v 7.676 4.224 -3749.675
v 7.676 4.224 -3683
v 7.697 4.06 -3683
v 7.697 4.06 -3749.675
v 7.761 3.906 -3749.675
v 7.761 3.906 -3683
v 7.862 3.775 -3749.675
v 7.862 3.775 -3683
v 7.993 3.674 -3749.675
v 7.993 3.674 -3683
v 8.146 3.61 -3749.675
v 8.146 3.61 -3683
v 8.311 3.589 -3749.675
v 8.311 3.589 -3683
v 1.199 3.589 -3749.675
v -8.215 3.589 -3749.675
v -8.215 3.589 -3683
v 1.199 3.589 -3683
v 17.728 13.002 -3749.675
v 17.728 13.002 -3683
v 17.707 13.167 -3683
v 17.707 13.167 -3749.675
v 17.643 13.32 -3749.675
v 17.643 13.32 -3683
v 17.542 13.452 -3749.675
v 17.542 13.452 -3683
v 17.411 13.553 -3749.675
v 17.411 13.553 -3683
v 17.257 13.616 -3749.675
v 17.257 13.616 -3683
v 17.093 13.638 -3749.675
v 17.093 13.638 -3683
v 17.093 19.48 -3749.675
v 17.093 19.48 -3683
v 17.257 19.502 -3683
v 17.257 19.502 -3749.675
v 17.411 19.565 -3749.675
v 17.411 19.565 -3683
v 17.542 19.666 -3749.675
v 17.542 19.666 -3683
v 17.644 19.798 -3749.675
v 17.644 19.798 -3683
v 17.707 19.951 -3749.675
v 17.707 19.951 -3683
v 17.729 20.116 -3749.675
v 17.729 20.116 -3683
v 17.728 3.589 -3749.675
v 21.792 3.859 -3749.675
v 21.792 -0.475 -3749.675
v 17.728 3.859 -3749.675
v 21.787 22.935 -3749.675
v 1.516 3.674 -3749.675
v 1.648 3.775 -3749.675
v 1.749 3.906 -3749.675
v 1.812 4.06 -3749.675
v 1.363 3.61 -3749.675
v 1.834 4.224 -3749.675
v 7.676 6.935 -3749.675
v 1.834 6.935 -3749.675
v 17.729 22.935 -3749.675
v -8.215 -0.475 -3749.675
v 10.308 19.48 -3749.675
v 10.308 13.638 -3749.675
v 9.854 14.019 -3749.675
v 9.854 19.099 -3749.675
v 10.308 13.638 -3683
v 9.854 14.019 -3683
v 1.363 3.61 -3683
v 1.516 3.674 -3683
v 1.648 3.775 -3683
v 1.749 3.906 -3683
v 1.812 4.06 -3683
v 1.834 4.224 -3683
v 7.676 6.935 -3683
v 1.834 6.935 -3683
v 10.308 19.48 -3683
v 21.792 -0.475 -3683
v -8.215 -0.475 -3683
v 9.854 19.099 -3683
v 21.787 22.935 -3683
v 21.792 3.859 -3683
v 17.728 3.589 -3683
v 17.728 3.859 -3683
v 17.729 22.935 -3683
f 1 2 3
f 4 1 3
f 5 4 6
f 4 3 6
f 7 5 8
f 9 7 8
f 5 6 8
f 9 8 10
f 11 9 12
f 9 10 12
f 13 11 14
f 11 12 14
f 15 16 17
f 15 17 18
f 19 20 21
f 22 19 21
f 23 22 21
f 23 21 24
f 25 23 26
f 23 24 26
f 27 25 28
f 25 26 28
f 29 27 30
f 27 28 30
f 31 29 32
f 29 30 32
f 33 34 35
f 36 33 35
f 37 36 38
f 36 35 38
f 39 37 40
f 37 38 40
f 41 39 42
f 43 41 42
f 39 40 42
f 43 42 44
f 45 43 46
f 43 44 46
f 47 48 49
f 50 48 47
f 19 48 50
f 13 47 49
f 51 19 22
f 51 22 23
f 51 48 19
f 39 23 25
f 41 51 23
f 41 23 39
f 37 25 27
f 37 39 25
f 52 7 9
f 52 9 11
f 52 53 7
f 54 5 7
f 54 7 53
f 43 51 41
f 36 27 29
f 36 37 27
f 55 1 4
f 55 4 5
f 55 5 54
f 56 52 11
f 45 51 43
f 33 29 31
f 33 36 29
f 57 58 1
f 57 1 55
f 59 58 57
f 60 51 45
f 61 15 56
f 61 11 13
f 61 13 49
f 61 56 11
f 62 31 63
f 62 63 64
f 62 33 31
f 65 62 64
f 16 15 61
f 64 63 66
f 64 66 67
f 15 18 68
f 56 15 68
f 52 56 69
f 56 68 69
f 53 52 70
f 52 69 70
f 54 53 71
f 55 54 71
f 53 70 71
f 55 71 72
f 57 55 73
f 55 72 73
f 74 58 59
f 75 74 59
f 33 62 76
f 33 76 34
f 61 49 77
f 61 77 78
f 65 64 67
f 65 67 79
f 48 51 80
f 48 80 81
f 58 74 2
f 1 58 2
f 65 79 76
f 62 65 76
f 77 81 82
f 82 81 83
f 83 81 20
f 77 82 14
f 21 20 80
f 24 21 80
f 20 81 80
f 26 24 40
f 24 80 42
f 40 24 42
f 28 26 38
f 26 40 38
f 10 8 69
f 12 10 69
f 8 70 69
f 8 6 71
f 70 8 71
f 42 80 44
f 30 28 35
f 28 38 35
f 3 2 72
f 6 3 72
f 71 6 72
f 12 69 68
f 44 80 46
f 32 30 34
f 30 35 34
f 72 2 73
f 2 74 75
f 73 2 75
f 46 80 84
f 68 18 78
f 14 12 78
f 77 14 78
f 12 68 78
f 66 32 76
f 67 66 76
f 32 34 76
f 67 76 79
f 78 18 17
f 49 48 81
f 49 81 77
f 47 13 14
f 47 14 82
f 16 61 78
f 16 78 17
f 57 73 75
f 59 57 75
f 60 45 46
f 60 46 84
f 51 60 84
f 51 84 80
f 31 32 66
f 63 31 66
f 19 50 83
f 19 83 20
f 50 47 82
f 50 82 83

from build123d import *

# Parameters (mm, degrees)
BOSS_EXTRUDE1_DEPTH = 66.675
CUT_EXTRUDE1_REACH  = 75.8
CUT_EXTRUDE2_REACH  = 75.8
SKETCH6_W           = 5.842
SKETCH6_H           = 4.878381591
CUT_EXTRUDE4_DEPTH  = 74.800184057


with BuildPart() as part:
    # Sketch1 → Boss-Extrude1 (new body)
    with BuildSketch(Plane(origin=(0, 0, -3683), x_dir=(-1, 0, 0), z_dir=(0, 0, -1))):
        with BuildLine():
            Line((7.945265893, 3.588862728), (-1.198734107, 3.588862728))
            ThreePointArc((-1.198734107, 3.588862728), (-1.647746913, 3.774849922), (-1.833734107, 4.223862728))
            Line((-1.833734107, 4.223862728), (-1.833734107, 5.747862728))
            ThreePointArc((-1.833734107, 5.747862728), (-1.647746913, 6.196875535), (-1.198734107, 6.382862728))
            Line((-1.198734107, 6.382862728), (1.621629442, 6.382862728))
            Line((1.621629442, 6.382862728), (1.621629442, 6.890862686))
            Line((1.621629442, 6.890862686), (-2.214734107, 11.462862728))
            Line((-2.214734107, 11.462862728), (-7.294734107, 11.462862728))
            Line((-7.294734107, 11.462862728), (-11.131097656, 6.890862686))
            Line((-11.131097656, 6.890862686), (-11.131097656, 6.382862728))
            Line((-11.131097656, 6.382862728), (-8.310734107, 6.382862728))
            ThreePointArc((-8.310734107, 6.382862728), (-7.861721301, 6.196875535), (-7.675734107, 5.747862728))
            Line((-7.675734107, 5.747862728), (-7.675734107, 4.223862728))
            ThreePointArc((-7.675734107, 4.223862728), (-7.861721301, 3.774849922), (-8.310734107, 3.588862728))
            Line((-8.310734107, 3.588862728), (-17.454734107, 3.588862728))
            Line((-17.454734107, 3.588862728), (-17.727921752, 3.588862728))
            Line((-17.727921752, 3.588862728), (-17.727921752, 3.858842754))
            Line((-17.727921752, 3.858842754), (-17.728361466, 13.002372481))
            ThreePointArc((-17.728361466, 13.002372481), (-17.542256287, 13.451715967), (-17.092921752, 13.637842754))
            Line((-17.092921752, 13.637842754), (-15.568921752, 13.637842754))
            ThreePointArc((-15.568921752, 13.637842754), (-15.119908946, 13.45185556), (-14.933921752, 13.002842754))
            Line((-14.933921752, 13.002842754), (-14.933921752, 10.182479205))
            Line((-14.933921752, 10.182479205), (-14.425921794, 10.182479205))
            Line((-14.425921794, 10.182479205), (-9.853921752, 14.018842754))
            Line((-9.853921752, 14.018842754), (-9.853921752, 19.098842754))
            Line((-9.853921752, 19.098842754), (-14.425921794, 22.935206303))
            Line((-14.425921794, 22.935206303), (-14.933921752, 22.935206303))
            Line((-14.933921752, 22.935206303), (-14.933921752, 20.114842754))
            ThreePointArc((-14.933921752, 20.114842754), (-15.119908946, 19.665829948), (-15.568921752, 19.479842754))
            Line((-15.568921752, 19.479842754), (-17.092921752, 19.479842754))
            ThreePointArc((-17.092921752, 19.479842754), (-17.542476558, 19.66604812), (-17.728703542, 20.11559397))
            Line((-17.728703542, 20.11559397), (-17.728839138, 22.935206303))
            Line((-17.728839138, 22.935206303), (-21.787214199, 22.935206303))
            Line((-21.787214199, 22.935206303), (-21.791921752, 3.859128788))
            Line((-21.791921752, 3.859128788), (-21.791921752, 3.588862728))
            Line((-21.791921752, 3.588862728), (-21.791921752, -0.475137272))
            Line((-21.791921752, -0.475137272), (-17.727921752, -0.475137272))
            Line((-17.727921752, -0.475137272), (-17.454774021, -0.475137272))
            Line((-17.454774021, -0.475137272), (7.945225979, -0.475137272))
            Line((7.945225979, -0.475137272), (8.215492039, -0.475137272))
            Line((8.215492039, -0.475137272), (8.215492039, 3.588862728))
            Line((8.215492039, 3.588862728), (7.945265893, 3.588862728))
        make_face()
    extrude(amount=BOSS_EXTRUDE1_DEPTH)

    # Sketch2 → Cut-Extrude1 (cut, up to next)
    with BuildSketch(Plane.XY.offset(-3683), mode=Mode.PRIVATE) as cut_extrude1_sk1:
        with BuildLine():
            Line((11.131097656, 6.890862686), (11.131097656, 6.382862728))
            Line((11.131097656, 6.382862728), (8.310734107, 6.382862728))
            ThreePointArc((8.310734107, 6.382862728), (7.861721301, 6.196875535), (7.675734107, 5.747862728))
            Line((7.675734107, 5.747862728), (7.675734107, 11.00880461))
            Line((7.675734107, 11.00880461), (11.131097656, 6.890862686))
        make_face()
    cut_extrude1_tool1 = extrude(cut_extrude1_sk1.sketch, amount=-CUT_EXTRUDE1_REACH, mode=Mode.PRIVATE) & part.part
    # Sketch2 → Cut-Extrude1 (cut, up to next)
    with BuildSketch(Plane.XY.offset(-3683), mode=Mode.PRIVATE) as cut_extrude1_sk2:
        with BuildLine():
            Line((1.833734107, 5.747862728), (1.833734107, 11.00880461))
            Line((1.833734107, 11.00880461), (-1.621629442, 6.890862686))
            Line((-1.621629442, 6.890862686), (-1.621629442, 6.382862728))
            Line((-1.621629442, 6.382862728), (1.198734107, 6.382862728))
            ThreePointArc((1.198734107, 6.382862728), (1.647746913, 6.196875535), (1.833734107, 5.747862728))
        make_face()
    cut_extrude1_tool2 = extrude(cut_extrude1_sk2.sketch, amount=-CUT_EXTRUDE1_REACH, mode=Mode.PRIVATE) & part.part
    add(cut_extrude1_tool1.solids().sort_by_distance((8.930632, 7.925168, -3683))[0], mode=Mode.SUBTRACT)
    add(cut_extrude1_tool2.solids().sort_by_distance((0.578837, 7.925168, -3683))[0], mode=Mode.SUBTRACT)

    # Sketch3 → Cut-Extrude2 (cut, up to next)
    with BuildSketch(Plane.XY.offset(-3683), mode=Mode.PRIVATE) as cut_extrude2_sk1:
        with BuildLine():
            Line((15.568921752, 19.479842754), (10.307979871, 19.479842754))
            Line((10.307979871, 19.479842754), (14.425921794, 22.935206303))
            Line((14.425921794, 22.935206303), (14.933921752, 22.935206303))
            Line((14.933921752, 22.935206303), (14.933921752, 20.114842754))
            ThreePointArc((14.933921752, 20.114842754), (15.119908946, 19.665829948), (15.568921752, 19.479842754))
        make_face()
    cut_extrude2_tool1 = extrude(cut_extrude2_sk1.sketch, amount=-CUT_EXTRUDE2_REACH, mode=Mode.PRIVATE) & part.part
    # Sketch3 → Cut-Extrude2 (cut, up to next)
    with BuildSketch(Plane.XY.offset(-3683), mode=Mode.PRIVATE) as cut_extrude2_sk2:
        with BuildLine():
            Line((10.307979871, 13.637842754), (14.425921794, 10.182479205))
            Line((14.425921794, 10.182479205), (14.933921752, 10.182479205))
            Line((14.933921752, 10.182479205), (14.933921752, 13.002842754))
            ThreePointArc((14.933921752, 13.002842754), (15.119908946, 13.45185556), (15.568921752, 13.637842754))
            Line((15.568921752, 13.637842754), (10.307979871, 13.637842754))
        make_face()
    cut_extrude2_tool2 = extrude(cut_extrude2_sk2.sketch, amount=-CUT_EXTRUDE2_REACH, mode=Mode.PRIVATE) & part.part
    add(cut_extrude2_tool1.solids().sort_by_distance((13.391616, 20.73474, -3683))[0], mode=Mode.SUBTRACT)
    add(cut_extrude2_tool2.solids().sort_by_distance((13.391616, 12.382945, -3683))[0], mode=Mode.SUBTRACT)

    # Sketch6 → Cut-Extrude4 (cut, through all)
    with BuildSketch(Plane(origin=(0, 0, -3749.675), x_dir=(-1, 0, 0), z_dir=(0, 0, -1))):
        with Locations((-4.754734107, 9.374581689)):
            Rectangle(SKETCH6_W, SKETCH6_H)
    extrude(amount=-CUT_EXTRUDE4_DEPTH, mode=Mode.SUBTRACT)


solid = part.part
